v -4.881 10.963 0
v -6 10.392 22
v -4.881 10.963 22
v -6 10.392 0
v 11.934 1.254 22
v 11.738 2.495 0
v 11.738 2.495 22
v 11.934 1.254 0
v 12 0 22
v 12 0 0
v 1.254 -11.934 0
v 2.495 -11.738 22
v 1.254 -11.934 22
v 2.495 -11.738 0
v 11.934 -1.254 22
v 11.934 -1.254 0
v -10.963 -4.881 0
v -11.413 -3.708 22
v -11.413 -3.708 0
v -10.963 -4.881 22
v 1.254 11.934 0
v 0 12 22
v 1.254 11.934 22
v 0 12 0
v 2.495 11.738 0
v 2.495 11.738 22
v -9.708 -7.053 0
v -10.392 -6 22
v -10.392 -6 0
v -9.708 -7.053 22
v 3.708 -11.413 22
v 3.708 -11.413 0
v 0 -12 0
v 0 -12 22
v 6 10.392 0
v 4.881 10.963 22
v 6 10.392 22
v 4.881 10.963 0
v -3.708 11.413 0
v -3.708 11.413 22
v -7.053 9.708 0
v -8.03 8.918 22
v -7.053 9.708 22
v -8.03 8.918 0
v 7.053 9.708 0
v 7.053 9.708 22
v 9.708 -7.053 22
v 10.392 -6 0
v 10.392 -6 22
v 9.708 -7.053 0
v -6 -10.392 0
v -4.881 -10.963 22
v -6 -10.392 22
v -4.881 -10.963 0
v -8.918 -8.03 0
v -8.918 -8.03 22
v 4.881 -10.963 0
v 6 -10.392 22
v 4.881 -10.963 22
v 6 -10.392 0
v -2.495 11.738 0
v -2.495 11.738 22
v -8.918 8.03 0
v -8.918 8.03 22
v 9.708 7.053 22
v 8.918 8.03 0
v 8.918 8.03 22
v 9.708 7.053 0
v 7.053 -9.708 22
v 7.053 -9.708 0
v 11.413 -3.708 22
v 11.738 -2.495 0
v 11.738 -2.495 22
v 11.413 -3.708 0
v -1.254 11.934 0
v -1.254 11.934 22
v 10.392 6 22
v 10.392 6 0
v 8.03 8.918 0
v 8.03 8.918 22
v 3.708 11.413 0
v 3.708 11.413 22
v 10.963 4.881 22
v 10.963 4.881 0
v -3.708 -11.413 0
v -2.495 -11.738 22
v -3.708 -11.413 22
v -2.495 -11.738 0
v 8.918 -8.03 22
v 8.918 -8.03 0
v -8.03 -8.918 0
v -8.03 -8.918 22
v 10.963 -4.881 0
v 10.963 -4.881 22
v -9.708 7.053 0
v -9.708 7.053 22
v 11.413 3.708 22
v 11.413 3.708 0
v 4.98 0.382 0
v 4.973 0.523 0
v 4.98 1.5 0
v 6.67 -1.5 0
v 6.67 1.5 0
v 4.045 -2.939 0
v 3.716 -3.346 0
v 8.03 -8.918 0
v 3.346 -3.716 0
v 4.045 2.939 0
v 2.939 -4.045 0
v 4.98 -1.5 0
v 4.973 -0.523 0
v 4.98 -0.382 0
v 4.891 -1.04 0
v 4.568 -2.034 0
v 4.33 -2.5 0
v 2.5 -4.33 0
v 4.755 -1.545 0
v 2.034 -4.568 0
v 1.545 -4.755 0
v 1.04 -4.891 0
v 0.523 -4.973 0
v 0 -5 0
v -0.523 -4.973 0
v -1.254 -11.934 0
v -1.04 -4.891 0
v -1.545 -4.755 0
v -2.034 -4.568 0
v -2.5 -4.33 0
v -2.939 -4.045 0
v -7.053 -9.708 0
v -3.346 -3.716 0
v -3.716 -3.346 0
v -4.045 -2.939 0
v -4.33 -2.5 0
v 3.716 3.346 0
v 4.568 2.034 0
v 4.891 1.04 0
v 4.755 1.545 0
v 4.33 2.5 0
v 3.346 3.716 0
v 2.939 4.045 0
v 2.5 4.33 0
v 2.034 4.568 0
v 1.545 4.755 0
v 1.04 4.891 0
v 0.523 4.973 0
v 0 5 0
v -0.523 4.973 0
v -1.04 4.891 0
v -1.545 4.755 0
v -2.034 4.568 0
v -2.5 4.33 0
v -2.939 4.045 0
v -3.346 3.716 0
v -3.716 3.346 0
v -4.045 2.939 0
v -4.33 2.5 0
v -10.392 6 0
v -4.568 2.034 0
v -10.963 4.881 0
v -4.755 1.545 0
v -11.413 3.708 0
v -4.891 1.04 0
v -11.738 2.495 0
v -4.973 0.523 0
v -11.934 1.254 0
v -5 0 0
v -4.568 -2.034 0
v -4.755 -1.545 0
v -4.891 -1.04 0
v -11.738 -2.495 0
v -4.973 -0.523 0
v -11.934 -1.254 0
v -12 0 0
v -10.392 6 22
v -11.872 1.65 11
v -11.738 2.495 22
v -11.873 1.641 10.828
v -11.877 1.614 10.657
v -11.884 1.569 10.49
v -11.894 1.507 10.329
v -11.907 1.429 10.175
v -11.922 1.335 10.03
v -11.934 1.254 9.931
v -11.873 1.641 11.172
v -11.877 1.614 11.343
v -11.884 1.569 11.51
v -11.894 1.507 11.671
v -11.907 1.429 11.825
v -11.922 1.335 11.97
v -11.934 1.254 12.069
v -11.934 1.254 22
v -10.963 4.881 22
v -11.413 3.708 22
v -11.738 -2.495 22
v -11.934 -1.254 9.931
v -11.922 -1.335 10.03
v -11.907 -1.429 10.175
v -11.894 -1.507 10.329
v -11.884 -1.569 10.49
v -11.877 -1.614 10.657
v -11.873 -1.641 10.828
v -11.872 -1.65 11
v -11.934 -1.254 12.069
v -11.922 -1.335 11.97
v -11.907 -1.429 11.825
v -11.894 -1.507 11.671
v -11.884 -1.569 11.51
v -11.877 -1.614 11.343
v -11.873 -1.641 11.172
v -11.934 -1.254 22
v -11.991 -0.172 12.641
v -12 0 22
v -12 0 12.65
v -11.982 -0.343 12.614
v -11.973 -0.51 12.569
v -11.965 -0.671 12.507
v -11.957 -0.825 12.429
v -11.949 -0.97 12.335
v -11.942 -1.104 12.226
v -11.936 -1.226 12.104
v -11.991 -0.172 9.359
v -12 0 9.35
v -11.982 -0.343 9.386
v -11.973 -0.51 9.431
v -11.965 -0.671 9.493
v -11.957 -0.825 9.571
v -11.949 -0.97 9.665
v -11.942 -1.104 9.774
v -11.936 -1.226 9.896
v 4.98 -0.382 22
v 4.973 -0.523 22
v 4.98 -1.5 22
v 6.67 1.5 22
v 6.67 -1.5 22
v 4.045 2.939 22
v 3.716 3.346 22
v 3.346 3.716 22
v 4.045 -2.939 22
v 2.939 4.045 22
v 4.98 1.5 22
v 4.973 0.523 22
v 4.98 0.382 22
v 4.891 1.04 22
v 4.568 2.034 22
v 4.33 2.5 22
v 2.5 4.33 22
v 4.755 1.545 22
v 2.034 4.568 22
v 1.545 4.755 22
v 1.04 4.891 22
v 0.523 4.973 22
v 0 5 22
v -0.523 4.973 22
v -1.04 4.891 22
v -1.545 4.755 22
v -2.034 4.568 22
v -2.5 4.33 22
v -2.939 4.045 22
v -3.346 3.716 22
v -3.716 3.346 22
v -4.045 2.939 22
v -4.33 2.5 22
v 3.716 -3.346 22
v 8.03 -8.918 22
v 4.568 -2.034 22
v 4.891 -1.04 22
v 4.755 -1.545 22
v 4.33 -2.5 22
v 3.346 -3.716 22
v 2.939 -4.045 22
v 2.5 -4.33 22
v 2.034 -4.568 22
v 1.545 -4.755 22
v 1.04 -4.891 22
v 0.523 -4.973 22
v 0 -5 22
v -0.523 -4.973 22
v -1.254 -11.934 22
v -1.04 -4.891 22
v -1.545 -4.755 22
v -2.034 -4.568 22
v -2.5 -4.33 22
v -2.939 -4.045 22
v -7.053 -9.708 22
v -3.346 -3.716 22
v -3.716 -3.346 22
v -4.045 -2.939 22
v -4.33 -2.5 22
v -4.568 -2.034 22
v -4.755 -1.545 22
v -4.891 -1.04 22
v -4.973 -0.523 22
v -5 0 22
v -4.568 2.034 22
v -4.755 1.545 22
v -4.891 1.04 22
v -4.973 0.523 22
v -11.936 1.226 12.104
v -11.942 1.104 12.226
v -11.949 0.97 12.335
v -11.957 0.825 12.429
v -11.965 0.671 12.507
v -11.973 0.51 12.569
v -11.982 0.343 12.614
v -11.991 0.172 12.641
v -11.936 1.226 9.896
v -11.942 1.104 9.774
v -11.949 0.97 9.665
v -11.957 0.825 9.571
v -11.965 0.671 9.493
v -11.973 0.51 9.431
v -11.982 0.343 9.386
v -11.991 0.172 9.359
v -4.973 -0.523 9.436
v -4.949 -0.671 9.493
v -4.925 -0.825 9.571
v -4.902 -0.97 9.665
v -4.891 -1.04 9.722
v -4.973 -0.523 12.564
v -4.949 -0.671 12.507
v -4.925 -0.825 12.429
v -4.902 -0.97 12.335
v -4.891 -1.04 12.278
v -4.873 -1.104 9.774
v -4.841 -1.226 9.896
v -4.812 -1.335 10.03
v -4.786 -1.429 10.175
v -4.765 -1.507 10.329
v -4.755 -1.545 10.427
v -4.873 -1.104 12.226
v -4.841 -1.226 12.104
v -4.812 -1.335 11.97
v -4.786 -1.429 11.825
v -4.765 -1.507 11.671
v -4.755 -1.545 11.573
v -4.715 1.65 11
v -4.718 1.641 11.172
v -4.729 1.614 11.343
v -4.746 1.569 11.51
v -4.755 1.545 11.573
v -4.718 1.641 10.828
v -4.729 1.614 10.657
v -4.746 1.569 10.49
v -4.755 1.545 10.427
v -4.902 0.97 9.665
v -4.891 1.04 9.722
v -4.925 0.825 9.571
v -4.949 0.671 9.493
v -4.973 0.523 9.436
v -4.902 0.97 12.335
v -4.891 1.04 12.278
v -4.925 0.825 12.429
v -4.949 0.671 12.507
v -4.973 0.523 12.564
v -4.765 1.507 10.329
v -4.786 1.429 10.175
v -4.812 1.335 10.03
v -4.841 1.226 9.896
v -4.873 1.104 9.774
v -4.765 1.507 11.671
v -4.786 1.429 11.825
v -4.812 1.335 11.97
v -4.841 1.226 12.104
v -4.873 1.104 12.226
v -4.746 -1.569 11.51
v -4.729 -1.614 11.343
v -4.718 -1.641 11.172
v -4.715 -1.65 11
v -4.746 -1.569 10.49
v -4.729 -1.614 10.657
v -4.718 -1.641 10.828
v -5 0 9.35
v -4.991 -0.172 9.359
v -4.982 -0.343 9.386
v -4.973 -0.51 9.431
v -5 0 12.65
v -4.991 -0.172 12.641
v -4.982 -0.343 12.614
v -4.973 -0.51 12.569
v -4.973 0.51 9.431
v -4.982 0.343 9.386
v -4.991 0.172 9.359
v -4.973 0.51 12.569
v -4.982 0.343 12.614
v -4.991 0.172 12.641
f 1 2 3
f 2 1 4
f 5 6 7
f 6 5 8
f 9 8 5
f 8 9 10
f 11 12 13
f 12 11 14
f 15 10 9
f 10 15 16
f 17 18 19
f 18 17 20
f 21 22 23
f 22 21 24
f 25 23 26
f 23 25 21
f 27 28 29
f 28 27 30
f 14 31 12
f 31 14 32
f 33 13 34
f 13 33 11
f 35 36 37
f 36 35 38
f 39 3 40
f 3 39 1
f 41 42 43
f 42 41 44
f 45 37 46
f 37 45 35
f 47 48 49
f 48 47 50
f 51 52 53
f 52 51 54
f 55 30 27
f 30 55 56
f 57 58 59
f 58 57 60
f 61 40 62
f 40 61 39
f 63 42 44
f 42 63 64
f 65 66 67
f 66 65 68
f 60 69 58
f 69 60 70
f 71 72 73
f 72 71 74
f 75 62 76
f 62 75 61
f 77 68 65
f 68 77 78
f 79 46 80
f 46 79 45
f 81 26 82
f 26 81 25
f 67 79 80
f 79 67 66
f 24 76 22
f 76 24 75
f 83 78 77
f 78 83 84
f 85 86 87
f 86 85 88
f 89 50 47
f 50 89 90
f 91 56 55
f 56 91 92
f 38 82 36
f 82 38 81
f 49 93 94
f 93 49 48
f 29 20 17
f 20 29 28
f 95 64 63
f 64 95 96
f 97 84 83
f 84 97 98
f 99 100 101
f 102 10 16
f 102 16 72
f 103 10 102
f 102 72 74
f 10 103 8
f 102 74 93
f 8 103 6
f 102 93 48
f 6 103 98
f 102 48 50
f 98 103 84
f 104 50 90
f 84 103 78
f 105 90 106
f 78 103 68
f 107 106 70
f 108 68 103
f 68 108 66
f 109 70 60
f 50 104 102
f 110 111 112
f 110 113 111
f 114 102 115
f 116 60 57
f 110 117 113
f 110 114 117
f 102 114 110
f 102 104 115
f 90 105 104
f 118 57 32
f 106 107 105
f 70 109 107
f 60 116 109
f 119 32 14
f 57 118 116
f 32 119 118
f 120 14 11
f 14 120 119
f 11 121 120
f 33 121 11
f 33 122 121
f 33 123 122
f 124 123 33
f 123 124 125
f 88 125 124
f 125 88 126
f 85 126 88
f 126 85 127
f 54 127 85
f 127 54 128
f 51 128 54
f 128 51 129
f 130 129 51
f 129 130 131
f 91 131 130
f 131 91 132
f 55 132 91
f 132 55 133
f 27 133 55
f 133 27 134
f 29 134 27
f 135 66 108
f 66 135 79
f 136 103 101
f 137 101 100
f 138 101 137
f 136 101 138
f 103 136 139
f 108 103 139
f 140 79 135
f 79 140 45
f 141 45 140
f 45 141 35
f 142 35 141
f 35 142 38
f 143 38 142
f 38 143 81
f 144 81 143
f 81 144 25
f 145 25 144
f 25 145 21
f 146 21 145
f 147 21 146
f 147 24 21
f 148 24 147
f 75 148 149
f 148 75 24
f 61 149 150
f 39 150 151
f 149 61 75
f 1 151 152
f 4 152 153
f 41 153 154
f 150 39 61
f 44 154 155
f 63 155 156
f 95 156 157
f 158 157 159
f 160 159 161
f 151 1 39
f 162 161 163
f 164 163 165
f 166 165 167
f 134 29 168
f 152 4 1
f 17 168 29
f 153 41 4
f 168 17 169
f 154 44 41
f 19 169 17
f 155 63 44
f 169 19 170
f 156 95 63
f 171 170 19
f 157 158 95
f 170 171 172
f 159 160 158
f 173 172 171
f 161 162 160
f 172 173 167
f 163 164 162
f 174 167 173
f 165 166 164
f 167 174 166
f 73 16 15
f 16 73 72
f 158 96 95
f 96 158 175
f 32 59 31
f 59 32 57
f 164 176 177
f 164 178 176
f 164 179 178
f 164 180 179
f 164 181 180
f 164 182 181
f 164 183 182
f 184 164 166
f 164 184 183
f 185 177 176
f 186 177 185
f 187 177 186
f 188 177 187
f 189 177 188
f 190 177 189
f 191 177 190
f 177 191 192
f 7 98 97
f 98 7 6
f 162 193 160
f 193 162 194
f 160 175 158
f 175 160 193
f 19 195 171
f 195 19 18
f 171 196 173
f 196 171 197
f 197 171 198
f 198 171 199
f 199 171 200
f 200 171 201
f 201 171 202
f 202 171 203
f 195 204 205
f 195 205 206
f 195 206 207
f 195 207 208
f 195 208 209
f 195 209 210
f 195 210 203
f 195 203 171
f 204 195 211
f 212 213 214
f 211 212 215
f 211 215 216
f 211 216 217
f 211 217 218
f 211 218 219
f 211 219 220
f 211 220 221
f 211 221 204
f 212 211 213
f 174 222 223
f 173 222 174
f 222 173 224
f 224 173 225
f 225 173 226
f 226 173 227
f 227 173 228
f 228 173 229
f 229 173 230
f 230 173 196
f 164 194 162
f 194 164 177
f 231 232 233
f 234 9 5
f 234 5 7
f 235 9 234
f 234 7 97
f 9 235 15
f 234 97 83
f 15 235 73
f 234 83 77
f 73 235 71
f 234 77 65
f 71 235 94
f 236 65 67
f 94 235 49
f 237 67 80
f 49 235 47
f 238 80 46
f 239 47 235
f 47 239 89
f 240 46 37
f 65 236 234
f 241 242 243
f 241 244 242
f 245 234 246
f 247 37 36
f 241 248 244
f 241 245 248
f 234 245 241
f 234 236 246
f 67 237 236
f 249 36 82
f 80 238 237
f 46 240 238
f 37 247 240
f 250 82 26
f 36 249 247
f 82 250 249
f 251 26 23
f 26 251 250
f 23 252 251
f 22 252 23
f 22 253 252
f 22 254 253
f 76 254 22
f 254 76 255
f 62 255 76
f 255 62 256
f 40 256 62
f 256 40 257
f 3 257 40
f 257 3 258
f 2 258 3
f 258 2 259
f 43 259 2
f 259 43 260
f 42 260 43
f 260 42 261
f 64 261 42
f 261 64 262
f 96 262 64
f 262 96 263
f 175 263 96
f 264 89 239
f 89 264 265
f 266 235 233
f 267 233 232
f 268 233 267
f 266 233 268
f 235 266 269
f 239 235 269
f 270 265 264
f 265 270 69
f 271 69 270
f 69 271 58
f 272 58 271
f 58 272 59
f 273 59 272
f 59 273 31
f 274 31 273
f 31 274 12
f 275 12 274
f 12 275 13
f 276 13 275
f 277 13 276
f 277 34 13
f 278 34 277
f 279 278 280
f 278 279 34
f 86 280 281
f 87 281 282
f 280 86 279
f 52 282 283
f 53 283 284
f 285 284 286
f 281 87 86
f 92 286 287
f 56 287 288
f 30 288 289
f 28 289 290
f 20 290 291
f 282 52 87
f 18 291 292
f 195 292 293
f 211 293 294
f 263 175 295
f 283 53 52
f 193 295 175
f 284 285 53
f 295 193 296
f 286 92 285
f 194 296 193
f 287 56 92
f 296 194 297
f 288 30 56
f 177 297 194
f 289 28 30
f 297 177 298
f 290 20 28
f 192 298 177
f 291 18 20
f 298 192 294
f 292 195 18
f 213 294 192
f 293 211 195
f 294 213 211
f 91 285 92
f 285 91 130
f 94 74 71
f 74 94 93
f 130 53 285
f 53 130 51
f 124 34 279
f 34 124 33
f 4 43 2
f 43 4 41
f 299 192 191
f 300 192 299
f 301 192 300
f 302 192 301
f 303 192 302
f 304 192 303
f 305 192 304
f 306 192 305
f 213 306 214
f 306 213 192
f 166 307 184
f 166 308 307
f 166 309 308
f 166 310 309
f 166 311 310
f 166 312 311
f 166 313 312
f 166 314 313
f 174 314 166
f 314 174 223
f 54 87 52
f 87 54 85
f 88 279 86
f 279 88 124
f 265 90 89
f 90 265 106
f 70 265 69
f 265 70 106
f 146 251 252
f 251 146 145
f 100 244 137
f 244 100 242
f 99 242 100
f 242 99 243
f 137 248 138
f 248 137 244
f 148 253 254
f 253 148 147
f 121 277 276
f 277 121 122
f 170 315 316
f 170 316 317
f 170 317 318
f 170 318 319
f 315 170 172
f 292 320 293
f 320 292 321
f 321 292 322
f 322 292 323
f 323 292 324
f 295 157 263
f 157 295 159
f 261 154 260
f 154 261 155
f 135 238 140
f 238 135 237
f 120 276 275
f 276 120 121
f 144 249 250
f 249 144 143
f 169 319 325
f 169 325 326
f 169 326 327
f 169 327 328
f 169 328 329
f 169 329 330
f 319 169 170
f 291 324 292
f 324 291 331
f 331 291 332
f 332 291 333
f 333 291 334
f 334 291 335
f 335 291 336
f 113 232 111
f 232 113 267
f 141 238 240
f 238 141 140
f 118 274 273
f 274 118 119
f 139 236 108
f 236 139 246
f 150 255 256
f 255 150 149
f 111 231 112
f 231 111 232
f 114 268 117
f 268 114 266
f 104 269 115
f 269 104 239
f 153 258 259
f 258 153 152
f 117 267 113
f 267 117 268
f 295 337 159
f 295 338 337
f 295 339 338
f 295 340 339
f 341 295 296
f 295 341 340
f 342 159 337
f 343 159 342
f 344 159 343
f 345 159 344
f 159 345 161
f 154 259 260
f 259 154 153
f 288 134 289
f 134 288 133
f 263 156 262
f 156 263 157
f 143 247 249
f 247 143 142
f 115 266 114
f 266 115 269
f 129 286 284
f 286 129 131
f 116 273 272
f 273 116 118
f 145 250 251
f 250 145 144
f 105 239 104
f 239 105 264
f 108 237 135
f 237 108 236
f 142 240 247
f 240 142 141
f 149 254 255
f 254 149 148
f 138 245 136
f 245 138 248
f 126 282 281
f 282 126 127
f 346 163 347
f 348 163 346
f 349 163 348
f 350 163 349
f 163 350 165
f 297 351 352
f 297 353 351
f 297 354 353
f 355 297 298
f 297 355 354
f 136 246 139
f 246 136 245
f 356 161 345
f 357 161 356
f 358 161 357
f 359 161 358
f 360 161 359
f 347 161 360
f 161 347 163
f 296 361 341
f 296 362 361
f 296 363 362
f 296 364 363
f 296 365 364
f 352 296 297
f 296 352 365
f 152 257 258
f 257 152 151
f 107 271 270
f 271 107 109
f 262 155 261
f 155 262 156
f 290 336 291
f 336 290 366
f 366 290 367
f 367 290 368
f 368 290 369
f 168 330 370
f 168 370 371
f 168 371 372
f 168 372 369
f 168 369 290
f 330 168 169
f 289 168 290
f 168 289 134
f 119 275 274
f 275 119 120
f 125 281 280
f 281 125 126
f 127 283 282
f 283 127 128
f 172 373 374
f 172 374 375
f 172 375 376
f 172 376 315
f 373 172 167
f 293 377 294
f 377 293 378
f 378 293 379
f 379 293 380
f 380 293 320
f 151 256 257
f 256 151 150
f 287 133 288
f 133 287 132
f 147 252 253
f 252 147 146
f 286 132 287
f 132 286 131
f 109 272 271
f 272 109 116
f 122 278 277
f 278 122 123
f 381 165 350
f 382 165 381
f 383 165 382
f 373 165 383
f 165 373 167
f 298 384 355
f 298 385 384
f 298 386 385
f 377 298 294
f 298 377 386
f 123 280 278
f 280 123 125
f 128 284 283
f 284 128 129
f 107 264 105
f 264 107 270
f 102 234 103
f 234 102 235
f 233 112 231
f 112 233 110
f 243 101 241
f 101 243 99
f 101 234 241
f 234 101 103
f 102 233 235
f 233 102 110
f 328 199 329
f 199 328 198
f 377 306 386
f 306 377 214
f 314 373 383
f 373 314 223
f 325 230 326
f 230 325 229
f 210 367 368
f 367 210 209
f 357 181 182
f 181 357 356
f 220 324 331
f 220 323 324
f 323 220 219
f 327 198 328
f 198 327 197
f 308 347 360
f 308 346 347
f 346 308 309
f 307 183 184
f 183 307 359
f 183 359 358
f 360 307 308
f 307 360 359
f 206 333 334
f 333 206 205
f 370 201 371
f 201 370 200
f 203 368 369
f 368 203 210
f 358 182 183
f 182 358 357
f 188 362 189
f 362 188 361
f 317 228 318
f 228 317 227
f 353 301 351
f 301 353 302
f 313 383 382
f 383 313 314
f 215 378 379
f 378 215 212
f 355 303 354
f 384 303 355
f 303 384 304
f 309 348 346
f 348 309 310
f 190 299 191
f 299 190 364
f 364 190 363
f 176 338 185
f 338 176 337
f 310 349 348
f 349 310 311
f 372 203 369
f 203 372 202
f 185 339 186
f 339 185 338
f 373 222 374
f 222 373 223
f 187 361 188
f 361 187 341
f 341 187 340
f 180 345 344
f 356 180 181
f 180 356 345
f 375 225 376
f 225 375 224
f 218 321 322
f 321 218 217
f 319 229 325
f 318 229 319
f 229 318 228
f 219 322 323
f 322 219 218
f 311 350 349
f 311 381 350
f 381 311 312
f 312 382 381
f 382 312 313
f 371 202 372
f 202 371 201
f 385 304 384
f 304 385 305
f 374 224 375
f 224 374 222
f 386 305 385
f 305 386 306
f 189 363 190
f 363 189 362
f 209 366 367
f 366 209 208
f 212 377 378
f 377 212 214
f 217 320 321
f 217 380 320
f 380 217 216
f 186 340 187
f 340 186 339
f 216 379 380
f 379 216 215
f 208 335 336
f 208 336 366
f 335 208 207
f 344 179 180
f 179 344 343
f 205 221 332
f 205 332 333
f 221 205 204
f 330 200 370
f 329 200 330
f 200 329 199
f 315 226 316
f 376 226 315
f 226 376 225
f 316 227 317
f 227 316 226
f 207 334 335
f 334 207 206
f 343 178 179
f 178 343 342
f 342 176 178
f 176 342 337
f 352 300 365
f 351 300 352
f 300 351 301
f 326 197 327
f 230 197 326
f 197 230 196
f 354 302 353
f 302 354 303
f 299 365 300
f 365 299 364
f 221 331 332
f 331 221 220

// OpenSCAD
// Keyway hub for a 10 mm shaft.
$fn = 60;
eps = 0.02;
shaft_d = 10;
outer_d = 24;
length = 22;
key_w = 3;
key_depth = 1.6500000000000001;
difference() {
    cylinder(d = outer_d, h = length);
    translate([0, 0, -eps]) cylinder(d = shaft_d, h = length + 2 * eps);
    translate([shaft_d / 2 - eps, -key_w / 2, -eps]) cube([key_depth + 2 * eps, key_w, length + 2 * eps]);
    translate([-outer_d / 2 - eps, 0, length / 2]) rotate([0, 90, 0]) cylinder(d = 3.3, h = outer_d / 2 + 2 * eps);
}
